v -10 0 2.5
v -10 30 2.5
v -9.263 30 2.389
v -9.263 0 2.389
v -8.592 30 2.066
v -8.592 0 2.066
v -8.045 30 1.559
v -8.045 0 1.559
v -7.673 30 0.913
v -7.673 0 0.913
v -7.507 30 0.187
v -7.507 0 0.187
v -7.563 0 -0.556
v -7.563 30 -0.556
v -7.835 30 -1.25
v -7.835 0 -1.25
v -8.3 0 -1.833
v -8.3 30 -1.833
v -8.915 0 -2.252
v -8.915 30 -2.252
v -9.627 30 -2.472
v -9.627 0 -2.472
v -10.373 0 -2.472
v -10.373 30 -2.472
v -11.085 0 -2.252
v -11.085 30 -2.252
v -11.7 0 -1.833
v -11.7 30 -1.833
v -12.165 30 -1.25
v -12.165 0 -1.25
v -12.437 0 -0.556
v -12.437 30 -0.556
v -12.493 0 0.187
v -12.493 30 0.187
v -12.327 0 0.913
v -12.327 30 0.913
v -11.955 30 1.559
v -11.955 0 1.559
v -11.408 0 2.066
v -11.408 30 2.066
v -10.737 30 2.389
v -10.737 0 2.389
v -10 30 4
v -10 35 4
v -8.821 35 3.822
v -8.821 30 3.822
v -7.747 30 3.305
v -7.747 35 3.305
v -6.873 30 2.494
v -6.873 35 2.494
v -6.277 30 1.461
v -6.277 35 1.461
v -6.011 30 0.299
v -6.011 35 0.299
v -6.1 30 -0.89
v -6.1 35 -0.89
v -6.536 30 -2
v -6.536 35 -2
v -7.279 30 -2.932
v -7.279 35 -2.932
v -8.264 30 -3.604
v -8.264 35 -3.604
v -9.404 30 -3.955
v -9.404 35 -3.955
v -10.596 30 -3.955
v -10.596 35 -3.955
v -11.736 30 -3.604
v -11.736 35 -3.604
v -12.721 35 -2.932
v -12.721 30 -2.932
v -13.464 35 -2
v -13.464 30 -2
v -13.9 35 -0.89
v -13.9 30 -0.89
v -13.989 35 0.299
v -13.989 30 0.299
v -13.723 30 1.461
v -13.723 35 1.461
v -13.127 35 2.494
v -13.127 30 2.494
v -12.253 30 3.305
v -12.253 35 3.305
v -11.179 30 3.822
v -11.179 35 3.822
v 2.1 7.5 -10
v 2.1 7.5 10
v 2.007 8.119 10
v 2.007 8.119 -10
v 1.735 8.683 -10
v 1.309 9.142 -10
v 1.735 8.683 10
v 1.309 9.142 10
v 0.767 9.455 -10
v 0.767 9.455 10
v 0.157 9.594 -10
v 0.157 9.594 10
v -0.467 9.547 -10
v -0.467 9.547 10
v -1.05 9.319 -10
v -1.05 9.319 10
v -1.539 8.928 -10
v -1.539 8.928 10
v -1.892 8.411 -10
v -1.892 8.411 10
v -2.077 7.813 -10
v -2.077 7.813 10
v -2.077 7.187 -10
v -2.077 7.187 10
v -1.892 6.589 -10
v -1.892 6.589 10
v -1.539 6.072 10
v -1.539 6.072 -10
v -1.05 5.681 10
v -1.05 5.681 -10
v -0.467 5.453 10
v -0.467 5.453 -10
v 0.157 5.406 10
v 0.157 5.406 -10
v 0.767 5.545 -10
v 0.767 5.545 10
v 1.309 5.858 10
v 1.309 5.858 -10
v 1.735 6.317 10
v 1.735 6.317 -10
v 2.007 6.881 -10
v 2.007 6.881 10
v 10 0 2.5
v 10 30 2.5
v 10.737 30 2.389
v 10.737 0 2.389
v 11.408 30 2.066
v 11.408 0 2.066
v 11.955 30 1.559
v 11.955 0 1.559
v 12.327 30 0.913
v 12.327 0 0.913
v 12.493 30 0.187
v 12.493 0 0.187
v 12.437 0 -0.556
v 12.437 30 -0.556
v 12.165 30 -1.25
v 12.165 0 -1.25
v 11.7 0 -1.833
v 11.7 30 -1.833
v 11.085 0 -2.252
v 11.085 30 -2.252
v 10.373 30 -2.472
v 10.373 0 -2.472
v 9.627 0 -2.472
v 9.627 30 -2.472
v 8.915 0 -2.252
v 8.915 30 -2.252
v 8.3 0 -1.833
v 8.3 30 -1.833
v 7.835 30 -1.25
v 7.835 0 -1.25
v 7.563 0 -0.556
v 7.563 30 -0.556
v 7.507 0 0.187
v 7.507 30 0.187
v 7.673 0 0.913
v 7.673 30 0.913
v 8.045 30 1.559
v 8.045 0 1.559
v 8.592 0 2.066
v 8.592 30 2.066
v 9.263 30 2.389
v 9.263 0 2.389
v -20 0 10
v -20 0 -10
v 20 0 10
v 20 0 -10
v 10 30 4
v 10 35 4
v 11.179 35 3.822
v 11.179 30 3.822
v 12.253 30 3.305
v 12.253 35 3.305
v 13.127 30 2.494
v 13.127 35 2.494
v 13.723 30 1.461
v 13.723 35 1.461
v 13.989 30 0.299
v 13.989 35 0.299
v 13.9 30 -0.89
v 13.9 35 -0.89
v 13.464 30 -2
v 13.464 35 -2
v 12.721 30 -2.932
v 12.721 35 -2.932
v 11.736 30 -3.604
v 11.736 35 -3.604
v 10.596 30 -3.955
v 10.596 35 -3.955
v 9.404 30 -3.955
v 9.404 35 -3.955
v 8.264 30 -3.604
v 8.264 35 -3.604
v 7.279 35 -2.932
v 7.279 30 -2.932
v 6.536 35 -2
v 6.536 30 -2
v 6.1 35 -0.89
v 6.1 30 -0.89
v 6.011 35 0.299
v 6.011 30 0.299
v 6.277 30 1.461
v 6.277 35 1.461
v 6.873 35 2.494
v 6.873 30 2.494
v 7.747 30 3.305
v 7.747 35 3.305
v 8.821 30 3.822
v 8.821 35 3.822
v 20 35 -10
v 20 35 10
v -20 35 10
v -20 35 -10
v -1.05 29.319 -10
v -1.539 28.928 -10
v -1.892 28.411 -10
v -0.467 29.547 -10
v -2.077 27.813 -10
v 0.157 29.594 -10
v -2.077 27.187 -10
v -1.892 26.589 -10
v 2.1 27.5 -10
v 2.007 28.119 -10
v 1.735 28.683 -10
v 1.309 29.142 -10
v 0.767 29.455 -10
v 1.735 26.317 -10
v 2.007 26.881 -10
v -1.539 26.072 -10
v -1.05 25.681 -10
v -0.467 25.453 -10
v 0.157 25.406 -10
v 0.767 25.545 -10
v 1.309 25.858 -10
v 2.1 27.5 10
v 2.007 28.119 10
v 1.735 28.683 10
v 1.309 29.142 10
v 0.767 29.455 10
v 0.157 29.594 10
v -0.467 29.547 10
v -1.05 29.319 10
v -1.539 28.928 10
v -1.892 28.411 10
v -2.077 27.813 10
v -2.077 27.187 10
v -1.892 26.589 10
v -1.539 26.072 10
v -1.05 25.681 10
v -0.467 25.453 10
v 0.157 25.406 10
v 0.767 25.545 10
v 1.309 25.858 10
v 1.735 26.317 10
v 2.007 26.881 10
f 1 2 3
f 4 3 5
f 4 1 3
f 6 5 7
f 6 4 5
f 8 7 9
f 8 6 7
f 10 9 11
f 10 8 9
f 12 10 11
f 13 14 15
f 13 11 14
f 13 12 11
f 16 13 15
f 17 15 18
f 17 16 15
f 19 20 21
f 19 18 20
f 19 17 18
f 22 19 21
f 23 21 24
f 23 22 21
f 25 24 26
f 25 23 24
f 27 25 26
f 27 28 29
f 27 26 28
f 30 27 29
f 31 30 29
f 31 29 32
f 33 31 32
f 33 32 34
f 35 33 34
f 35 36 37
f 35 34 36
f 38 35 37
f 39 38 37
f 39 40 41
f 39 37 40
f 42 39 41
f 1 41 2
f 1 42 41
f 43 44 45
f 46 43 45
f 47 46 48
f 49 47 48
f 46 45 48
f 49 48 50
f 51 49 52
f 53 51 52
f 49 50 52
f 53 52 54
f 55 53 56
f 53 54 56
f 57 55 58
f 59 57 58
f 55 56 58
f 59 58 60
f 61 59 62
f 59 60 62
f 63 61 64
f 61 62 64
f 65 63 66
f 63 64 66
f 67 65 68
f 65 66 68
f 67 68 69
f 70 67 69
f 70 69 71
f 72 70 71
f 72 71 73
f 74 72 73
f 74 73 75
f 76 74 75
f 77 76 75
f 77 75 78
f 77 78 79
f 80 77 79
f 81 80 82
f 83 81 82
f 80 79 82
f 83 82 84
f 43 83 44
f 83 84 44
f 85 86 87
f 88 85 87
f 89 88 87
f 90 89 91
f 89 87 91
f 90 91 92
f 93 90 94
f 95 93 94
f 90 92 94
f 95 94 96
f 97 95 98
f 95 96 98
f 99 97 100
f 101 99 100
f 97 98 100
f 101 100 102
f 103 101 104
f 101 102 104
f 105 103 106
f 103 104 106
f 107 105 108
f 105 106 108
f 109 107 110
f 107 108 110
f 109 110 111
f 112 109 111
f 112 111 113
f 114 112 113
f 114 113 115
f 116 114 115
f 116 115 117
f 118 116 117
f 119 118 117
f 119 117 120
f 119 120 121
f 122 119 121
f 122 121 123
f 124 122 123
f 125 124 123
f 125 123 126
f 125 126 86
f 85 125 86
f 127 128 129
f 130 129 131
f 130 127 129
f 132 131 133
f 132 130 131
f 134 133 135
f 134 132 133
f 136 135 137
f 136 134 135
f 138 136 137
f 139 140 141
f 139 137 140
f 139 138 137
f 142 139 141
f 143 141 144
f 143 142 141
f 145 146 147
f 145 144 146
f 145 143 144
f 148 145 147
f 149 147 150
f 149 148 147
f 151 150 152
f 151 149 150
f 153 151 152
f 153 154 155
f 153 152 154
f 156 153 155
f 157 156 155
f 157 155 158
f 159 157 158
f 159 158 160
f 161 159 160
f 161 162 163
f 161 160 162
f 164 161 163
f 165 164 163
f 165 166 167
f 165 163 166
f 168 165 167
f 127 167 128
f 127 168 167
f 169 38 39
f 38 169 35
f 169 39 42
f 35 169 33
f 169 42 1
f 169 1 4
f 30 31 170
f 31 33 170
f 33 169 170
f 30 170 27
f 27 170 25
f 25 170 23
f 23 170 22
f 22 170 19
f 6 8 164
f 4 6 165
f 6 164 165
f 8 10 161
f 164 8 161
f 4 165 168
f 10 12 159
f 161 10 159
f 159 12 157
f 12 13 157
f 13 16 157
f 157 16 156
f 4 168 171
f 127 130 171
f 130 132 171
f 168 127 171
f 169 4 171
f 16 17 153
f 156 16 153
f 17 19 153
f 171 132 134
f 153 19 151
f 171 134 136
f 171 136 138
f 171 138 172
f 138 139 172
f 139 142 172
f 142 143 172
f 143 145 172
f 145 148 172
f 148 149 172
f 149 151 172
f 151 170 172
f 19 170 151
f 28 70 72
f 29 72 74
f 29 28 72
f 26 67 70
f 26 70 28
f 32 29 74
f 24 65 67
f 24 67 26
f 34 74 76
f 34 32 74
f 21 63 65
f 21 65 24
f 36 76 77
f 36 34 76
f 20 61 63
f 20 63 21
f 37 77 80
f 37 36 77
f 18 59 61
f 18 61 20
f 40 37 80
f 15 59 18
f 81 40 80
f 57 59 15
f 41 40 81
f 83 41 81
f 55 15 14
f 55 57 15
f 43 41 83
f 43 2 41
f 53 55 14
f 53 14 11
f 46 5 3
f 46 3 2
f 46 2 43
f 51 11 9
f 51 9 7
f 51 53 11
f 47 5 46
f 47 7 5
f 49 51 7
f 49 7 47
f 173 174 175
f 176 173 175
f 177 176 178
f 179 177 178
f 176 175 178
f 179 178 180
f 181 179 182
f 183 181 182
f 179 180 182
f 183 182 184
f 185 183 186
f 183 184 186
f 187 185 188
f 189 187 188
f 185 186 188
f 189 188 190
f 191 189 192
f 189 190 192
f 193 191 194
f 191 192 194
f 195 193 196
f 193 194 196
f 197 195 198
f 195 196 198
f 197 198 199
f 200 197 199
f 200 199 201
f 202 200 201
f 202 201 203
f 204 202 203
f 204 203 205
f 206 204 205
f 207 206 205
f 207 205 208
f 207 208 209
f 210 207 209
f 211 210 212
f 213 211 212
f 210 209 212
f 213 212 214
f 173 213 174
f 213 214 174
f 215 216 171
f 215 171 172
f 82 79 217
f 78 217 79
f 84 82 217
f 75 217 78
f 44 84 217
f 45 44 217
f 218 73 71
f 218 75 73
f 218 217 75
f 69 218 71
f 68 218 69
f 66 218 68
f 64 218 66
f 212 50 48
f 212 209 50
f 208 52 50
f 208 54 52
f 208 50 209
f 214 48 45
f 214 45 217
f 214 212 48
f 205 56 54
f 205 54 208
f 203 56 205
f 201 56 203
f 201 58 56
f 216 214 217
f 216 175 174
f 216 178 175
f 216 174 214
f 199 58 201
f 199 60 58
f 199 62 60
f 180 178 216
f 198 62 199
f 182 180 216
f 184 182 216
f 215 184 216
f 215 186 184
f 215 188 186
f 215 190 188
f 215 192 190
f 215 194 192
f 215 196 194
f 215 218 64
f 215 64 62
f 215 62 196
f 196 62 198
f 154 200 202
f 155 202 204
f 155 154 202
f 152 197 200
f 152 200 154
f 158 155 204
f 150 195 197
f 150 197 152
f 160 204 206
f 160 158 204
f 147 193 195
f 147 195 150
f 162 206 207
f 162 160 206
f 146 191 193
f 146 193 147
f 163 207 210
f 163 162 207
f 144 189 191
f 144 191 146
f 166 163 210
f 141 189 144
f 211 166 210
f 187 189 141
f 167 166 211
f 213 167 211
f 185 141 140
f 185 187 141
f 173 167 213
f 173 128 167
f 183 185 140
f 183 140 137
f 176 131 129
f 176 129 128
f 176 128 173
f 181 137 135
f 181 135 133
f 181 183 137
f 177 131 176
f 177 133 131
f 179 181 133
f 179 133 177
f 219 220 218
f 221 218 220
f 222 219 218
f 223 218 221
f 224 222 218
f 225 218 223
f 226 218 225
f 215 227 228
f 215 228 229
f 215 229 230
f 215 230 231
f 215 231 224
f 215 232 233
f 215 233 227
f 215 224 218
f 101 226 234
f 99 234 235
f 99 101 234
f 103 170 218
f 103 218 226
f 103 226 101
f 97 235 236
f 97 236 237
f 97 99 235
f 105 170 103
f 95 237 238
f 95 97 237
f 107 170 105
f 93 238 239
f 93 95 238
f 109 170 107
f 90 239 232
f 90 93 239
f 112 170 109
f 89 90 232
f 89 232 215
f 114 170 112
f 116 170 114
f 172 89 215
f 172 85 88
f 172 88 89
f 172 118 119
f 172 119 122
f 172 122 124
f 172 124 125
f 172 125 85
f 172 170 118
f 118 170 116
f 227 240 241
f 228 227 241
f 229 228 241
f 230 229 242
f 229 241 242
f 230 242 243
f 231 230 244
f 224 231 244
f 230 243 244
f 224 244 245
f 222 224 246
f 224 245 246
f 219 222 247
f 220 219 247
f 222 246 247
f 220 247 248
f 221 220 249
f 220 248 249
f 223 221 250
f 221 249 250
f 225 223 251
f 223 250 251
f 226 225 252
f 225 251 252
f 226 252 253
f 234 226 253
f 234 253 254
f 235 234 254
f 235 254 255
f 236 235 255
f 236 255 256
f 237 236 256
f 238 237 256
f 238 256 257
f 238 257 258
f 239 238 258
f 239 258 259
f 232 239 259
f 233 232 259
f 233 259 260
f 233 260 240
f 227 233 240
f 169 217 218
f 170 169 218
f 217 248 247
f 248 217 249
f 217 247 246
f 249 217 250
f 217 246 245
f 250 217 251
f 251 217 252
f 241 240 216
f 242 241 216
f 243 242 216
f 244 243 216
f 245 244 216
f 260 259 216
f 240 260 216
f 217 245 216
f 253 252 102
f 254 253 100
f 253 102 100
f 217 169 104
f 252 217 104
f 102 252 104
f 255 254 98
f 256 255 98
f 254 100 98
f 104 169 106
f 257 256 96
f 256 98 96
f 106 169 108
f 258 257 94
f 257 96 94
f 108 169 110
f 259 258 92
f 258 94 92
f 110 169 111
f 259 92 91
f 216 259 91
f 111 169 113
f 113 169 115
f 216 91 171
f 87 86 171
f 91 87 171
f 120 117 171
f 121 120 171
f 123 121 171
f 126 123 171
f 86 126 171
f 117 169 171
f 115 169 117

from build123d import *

# Parameters (mm, degrees)
SKETCH1_W           = 40
SKETCH1_H           = 20
SKETCH1_R           = 2.5
BOSS_EXTRUDE1_DEPTH = 35
SKETCH2_R           = 4
CUT_EXTRUDE1_DEPTH  = 5
SKETCH3_R           = 2.1
CUT_EXTRUDE2_DEPTH  = 46


with BuildPart() as part:
    # Sketch1 → Boss-Extrude1 (new body)
    with BuildSketch(Plane(origin=(0, 0, 0), x_dir=(1, 0, 0), z_dir=(0, 1, 0))):
        Rectangle(SKETCH1_W, SKETCH1_H)
        with Locations(Location((-10, 0, 0), (0, 0, 270))):
            Circle(SKETCH1_R, mode=Mode.SUBTRACT)
        with Locations(Location((10, 0, 0), (0, 0, 270))):
            Circle(SKETCH1_R, mode=Mode.SUBTRACT)
    extrude(amount=BOSS_EXTRUDE1_DEPTH)

    # Sketch2 → Cut-Extrude1 (cut)
    with BuildSketch(Plane(origin=(0, 35, 0), x_dir=(1, 0, 0), z_dir=(0, 1, 0))):
        with Locations(Location((-10, 0, 0), (0, 0, 270))):
            Circle(SKETCH2_R)
        with Locations(Location((10, 0, 0), (0, 0, 270))):
            Circle(SKETCH2_R)
    extrude(amount=-CUT_EXTRUDE1_DEPTH, mode=Mode.SUBTRACT)

    # Sketch3 → Cut-Extrude2 (cut, through all)
    with BuildSketch(Plane.XY.offset(10)):
        with Locations((0, 27.5)):
            Circle(SKETCH3_R)
        with Locations((0, 7.5)):
            Circle(SKETCH3_R)
    extrude(amount=-CUT_EXTRUDE2_DEPTH, mode=Mode.SUBTRACT)


solid = part.part
